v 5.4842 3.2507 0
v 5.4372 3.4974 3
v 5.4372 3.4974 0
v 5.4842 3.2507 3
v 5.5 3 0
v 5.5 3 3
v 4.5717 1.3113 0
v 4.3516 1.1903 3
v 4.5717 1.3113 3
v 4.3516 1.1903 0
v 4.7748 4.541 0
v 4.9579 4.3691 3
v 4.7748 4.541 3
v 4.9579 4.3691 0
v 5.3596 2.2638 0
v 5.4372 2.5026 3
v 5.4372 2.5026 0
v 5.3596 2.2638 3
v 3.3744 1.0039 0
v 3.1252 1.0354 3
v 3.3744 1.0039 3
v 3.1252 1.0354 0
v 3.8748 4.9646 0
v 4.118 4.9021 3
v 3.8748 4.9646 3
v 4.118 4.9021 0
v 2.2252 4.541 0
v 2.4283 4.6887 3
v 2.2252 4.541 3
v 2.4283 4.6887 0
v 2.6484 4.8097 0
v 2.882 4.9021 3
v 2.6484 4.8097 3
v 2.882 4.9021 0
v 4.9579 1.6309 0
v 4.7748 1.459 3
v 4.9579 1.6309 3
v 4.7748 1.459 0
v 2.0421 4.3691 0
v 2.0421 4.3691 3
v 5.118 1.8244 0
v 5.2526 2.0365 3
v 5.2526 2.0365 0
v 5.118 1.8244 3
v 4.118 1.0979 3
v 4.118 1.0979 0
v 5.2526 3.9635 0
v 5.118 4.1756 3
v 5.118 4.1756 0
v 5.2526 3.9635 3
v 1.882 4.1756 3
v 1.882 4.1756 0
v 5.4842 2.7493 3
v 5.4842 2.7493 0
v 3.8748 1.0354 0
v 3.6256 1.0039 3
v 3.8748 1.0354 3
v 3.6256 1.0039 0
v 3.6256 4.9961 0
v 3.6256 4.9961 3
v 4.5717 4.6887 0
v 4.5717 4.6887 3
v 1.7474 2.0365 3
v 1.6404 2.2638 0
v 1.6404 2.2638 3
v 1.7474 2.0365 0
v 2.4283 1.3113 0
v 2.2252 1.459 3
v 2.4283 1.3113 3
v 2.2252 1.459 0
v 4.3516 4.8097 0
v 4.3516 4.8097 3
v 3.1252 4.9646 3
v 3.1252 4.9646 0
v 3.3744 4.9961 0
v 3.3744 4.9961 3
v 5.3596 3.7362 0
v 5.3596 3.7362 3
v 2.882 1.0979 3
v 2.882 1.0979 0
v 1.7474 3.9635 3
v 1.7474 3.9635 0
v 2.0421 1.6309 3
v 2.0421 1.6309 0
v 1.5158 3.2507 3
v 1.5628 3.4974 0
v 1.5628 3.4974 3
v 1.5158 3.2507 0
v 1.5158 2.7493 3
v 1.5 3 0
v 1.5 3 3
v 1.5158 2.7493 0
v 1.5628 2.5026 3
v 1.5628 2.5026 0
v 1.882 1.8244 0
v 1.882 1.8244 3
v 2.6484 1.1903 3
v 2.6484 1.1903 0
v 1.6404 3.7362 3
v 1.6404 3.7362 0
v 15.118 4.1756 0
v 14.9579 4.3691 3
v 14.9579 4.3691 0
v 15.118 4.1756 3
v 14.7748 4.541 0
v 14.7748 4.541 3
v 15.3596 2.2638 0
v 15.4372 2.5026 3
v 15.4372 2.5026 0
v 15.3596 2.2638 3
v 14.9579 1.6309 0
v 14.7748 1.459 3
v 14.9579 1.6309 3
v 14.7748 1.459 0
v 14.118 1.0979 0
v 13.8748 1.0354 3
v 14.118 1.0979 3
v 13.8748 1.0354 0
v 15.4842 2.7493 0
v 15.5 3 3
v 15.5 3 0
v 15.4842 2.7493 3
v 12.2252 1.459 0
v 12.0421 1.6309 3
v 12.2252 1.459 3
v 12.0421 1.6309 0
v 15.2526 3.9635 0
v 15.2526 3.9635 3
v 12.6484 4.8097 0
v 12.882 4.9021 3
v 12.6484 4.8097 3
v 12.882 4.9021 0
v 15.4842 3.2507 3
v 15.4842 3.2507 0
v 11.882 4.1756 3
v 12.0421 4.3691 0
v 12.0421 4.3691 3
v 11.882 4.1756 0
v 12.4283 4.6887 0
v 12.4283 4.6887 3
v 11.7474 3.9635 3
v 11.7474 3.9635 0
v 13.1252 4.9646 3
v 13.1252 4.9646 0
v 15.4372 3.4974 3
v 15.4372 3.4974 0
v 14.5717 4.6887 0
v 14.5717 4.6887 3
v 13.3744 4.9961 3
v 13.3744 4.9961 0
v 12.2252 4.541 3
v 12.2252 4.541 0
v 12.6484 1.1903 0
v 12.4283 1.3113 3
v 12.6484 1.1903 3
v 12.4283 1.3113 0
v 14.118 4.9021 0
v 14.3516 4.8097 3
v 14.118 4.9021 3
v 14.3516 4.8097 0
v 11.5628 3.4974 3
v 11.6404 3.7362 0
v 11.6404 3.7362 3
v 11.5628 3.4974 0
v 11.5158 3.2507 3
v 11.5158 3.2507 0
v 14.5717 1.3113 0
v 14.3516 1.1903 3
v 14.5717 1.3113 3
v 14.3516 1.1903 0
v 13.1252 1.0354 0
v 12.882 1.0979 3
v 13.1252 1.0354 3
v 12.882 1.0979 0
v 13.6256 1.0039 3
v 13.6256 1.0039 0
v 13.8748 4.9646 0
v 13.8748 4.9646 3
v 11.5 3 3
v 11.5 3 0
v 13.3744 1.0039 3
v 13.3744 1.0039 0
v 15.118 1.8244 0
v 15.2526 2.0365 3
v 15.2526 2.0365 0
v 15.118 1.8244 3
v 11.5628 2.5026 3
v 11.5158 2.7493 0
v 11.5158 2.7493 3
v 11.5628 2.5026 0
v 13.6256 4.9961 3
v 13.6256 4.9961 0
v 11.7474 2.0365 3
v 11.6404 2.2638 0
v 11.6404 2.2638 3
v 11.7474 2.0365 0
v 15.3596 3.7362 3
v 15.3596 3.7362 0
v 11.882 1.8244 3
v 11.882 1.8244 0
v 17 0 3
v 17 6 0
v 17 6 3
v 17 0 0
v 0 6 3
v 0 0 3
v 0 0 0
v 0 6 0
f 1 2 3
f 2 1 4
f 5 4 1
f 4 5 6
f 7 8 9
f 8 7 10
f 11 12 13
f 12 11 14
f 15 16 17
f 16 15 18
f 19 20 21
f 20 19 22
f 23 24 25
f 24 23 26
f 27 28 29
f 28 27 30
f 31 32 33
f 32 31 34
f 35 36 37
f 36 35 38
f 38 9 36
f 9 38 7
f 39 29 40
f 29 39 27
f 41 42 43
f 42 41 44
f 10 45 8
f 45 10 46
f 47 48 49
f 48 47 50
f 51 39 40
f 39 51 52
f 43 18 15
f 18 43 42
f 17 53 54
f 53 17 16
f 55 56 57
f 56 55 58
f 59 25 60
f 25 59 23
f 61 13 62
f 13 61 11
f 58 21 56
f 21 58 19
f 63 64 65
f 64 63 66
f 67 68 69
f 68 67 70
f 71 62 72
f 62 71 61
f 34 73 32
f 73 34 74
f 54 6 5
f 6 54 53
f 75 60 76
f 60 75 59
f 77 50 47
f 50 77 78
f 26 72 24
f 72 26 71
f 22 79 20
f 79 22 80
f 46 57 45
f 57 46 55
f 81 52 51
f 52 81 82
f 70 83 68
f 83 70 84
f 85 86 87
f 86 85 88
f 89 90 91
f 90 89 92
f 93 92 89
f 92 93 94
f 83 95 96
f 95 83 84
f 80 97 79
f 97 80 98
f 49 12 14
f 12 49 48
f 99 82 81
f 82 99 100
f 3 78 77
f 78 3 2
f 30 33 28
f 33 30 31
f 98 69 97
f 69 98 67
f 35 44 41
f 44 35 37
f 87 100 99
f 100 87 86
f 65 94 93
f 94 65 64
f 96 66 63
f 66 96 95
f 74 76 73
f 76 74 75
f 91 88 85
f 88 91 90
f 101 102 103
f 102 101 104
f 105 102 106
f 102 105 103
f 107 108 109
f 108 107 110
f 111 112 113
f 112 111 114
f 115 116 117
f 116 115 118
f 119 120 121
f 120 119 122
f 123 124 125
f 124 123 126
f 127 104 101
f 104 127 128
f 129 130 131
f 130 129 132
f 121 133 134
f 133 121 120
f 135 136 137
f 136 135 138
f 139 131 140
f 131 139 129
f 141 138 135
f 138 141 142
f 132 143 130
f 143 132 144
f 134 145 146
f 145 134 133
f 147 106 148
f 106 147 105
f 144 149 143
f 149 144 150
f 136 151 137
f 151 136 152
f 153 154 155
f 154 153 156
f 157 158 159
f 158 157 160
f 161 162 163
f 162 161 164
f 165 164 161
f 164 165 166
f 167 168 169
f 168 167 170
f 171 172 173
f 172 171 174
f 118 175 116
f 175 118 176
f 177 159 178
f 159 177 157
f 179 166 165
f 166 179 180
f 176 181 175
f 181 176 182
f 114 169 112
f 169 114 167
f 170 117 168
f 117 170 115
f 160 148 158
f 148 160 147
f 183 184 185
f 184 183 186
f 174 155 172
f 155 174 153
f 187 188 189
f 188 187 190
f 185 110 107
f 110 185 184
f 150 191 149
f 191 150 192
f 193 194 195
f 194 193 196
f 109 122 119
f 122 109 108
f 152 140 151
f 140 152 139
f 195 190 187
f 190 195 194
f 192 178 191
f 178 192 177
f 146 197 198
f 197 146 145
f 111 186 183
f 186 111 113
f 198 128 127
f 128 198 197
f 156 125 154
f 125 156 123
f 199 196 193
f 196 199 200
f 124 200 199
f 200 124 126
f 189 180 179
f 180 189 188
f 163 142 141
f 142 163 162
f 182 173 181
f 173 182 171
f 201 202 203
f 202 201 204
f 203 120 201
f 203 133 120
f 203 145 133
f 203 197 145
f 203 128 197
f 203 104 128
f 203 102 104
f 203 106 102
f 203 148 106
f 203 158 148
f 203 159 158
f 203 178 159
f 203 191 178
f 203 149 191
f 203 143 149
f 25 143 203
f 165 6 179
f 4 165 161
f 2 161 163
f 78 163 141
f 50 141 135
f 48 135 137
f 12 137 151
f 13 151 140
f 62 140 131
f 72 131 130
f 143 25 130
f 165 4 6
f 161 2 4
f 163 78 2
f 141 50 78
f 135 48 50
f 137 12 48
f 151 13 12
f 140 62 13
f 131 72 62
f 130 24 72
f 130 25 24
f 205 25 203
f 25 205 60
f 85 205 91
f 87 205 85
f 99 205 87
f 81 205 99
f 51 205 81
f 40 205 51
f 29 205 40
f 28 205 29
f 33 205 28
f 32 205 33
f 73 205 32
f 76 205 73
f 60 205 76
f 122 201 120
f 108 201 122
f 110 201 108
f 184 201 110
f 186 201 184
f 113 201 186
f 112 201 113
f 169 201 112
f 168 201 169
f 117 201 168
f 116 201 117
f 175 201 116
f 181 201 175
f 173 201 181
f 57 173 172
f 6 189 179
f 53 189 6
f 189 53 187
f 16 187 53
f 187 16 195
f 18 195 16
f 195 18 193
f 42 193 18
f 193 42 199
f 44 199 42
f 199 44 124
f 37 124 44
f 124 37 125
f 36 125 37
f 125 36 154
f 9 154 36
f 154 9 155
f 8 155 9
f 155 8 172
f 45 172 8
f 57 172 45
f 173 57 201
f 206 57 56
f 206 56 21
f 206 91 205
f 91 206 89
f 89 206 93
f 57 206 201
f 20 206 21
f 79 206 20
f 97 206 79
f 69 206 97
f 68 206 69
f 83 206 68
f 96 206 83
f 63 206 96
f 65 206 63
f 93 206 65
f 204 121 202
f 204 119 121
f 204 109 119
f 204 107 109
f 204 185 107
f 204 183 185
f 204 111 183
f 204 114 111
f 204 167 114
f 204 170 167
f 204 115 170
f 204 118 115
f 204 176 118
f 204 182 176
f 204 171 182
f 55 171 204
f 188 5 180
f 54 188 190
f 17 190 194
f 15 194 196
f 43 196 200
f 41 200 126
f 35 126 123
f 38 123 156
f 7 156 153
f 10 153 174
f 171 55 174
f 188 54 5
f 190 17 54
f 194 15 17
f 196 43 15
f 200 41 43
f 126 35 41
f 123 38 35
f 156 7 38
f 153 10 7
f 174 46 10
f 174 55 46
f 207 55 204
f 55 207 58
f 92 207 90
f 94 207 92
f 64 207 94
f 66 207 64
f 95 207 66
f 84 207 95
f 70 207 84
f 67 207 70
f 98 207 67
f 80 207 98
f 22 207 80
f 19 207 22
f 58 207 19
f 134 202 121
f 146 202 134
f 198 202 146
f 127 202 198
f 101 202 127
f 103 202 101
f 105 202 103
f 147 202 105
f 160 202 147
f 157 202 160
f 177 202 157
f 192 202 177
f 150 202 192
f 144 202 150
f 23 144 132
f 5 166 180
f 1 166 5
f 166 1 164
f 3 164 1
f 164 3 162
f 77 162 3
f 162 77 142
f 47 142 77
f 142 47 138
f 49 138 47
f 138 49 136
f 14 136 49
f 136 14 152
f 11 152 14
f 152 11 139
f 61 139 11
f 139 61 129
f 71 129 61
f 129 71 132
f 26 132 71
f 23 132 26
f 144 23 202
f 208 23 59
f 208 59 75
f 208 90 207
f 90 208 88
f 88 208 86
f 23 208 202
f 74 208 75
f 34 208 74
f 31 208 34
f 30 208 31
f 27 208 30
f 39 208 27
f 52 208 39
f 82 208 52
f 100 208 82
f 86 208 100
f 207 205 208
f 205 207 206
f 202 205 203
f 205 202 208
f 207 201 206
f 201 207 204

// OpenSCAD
/* Really simple "mending plate" with two #6 holes 
    -- I use this to clamp a GT2 belt, but it probably could be used
    for anything. Al Williams, April 2013 */
// Version 2 - Fixed holes where n>2

// Length of plate (mm)
length=17; // [10:100]
// Width of plate (mm)
width=6; // [5:100]
// Thickness of plate (mm)
thickness=3; // [.5:20]
// Offset from edge/hole spacing (mm)
edgeoffset=3.5	;  // [1:10]
// Number of holes (should be even)
n=2; // [[1:100]
// Hole radius (mm)
hole_radius=2;
loopct=n/2;
difference() {
cube([length,width,thickness]);
for (i=[1:loopct]) {
  translate([edgeoffset*i+2*hole_radius*(i-1),width/2,1]) cylinder(h=thickness*10,r=hole_radius,center=true,$fn=50);
  translate([length-(edgeoffset*i+2*hole_radius*(i-1)),width/2,1]) cylinder(h=thickness*10,r=hole_radius,center=true,$fn=50);
  }
}
